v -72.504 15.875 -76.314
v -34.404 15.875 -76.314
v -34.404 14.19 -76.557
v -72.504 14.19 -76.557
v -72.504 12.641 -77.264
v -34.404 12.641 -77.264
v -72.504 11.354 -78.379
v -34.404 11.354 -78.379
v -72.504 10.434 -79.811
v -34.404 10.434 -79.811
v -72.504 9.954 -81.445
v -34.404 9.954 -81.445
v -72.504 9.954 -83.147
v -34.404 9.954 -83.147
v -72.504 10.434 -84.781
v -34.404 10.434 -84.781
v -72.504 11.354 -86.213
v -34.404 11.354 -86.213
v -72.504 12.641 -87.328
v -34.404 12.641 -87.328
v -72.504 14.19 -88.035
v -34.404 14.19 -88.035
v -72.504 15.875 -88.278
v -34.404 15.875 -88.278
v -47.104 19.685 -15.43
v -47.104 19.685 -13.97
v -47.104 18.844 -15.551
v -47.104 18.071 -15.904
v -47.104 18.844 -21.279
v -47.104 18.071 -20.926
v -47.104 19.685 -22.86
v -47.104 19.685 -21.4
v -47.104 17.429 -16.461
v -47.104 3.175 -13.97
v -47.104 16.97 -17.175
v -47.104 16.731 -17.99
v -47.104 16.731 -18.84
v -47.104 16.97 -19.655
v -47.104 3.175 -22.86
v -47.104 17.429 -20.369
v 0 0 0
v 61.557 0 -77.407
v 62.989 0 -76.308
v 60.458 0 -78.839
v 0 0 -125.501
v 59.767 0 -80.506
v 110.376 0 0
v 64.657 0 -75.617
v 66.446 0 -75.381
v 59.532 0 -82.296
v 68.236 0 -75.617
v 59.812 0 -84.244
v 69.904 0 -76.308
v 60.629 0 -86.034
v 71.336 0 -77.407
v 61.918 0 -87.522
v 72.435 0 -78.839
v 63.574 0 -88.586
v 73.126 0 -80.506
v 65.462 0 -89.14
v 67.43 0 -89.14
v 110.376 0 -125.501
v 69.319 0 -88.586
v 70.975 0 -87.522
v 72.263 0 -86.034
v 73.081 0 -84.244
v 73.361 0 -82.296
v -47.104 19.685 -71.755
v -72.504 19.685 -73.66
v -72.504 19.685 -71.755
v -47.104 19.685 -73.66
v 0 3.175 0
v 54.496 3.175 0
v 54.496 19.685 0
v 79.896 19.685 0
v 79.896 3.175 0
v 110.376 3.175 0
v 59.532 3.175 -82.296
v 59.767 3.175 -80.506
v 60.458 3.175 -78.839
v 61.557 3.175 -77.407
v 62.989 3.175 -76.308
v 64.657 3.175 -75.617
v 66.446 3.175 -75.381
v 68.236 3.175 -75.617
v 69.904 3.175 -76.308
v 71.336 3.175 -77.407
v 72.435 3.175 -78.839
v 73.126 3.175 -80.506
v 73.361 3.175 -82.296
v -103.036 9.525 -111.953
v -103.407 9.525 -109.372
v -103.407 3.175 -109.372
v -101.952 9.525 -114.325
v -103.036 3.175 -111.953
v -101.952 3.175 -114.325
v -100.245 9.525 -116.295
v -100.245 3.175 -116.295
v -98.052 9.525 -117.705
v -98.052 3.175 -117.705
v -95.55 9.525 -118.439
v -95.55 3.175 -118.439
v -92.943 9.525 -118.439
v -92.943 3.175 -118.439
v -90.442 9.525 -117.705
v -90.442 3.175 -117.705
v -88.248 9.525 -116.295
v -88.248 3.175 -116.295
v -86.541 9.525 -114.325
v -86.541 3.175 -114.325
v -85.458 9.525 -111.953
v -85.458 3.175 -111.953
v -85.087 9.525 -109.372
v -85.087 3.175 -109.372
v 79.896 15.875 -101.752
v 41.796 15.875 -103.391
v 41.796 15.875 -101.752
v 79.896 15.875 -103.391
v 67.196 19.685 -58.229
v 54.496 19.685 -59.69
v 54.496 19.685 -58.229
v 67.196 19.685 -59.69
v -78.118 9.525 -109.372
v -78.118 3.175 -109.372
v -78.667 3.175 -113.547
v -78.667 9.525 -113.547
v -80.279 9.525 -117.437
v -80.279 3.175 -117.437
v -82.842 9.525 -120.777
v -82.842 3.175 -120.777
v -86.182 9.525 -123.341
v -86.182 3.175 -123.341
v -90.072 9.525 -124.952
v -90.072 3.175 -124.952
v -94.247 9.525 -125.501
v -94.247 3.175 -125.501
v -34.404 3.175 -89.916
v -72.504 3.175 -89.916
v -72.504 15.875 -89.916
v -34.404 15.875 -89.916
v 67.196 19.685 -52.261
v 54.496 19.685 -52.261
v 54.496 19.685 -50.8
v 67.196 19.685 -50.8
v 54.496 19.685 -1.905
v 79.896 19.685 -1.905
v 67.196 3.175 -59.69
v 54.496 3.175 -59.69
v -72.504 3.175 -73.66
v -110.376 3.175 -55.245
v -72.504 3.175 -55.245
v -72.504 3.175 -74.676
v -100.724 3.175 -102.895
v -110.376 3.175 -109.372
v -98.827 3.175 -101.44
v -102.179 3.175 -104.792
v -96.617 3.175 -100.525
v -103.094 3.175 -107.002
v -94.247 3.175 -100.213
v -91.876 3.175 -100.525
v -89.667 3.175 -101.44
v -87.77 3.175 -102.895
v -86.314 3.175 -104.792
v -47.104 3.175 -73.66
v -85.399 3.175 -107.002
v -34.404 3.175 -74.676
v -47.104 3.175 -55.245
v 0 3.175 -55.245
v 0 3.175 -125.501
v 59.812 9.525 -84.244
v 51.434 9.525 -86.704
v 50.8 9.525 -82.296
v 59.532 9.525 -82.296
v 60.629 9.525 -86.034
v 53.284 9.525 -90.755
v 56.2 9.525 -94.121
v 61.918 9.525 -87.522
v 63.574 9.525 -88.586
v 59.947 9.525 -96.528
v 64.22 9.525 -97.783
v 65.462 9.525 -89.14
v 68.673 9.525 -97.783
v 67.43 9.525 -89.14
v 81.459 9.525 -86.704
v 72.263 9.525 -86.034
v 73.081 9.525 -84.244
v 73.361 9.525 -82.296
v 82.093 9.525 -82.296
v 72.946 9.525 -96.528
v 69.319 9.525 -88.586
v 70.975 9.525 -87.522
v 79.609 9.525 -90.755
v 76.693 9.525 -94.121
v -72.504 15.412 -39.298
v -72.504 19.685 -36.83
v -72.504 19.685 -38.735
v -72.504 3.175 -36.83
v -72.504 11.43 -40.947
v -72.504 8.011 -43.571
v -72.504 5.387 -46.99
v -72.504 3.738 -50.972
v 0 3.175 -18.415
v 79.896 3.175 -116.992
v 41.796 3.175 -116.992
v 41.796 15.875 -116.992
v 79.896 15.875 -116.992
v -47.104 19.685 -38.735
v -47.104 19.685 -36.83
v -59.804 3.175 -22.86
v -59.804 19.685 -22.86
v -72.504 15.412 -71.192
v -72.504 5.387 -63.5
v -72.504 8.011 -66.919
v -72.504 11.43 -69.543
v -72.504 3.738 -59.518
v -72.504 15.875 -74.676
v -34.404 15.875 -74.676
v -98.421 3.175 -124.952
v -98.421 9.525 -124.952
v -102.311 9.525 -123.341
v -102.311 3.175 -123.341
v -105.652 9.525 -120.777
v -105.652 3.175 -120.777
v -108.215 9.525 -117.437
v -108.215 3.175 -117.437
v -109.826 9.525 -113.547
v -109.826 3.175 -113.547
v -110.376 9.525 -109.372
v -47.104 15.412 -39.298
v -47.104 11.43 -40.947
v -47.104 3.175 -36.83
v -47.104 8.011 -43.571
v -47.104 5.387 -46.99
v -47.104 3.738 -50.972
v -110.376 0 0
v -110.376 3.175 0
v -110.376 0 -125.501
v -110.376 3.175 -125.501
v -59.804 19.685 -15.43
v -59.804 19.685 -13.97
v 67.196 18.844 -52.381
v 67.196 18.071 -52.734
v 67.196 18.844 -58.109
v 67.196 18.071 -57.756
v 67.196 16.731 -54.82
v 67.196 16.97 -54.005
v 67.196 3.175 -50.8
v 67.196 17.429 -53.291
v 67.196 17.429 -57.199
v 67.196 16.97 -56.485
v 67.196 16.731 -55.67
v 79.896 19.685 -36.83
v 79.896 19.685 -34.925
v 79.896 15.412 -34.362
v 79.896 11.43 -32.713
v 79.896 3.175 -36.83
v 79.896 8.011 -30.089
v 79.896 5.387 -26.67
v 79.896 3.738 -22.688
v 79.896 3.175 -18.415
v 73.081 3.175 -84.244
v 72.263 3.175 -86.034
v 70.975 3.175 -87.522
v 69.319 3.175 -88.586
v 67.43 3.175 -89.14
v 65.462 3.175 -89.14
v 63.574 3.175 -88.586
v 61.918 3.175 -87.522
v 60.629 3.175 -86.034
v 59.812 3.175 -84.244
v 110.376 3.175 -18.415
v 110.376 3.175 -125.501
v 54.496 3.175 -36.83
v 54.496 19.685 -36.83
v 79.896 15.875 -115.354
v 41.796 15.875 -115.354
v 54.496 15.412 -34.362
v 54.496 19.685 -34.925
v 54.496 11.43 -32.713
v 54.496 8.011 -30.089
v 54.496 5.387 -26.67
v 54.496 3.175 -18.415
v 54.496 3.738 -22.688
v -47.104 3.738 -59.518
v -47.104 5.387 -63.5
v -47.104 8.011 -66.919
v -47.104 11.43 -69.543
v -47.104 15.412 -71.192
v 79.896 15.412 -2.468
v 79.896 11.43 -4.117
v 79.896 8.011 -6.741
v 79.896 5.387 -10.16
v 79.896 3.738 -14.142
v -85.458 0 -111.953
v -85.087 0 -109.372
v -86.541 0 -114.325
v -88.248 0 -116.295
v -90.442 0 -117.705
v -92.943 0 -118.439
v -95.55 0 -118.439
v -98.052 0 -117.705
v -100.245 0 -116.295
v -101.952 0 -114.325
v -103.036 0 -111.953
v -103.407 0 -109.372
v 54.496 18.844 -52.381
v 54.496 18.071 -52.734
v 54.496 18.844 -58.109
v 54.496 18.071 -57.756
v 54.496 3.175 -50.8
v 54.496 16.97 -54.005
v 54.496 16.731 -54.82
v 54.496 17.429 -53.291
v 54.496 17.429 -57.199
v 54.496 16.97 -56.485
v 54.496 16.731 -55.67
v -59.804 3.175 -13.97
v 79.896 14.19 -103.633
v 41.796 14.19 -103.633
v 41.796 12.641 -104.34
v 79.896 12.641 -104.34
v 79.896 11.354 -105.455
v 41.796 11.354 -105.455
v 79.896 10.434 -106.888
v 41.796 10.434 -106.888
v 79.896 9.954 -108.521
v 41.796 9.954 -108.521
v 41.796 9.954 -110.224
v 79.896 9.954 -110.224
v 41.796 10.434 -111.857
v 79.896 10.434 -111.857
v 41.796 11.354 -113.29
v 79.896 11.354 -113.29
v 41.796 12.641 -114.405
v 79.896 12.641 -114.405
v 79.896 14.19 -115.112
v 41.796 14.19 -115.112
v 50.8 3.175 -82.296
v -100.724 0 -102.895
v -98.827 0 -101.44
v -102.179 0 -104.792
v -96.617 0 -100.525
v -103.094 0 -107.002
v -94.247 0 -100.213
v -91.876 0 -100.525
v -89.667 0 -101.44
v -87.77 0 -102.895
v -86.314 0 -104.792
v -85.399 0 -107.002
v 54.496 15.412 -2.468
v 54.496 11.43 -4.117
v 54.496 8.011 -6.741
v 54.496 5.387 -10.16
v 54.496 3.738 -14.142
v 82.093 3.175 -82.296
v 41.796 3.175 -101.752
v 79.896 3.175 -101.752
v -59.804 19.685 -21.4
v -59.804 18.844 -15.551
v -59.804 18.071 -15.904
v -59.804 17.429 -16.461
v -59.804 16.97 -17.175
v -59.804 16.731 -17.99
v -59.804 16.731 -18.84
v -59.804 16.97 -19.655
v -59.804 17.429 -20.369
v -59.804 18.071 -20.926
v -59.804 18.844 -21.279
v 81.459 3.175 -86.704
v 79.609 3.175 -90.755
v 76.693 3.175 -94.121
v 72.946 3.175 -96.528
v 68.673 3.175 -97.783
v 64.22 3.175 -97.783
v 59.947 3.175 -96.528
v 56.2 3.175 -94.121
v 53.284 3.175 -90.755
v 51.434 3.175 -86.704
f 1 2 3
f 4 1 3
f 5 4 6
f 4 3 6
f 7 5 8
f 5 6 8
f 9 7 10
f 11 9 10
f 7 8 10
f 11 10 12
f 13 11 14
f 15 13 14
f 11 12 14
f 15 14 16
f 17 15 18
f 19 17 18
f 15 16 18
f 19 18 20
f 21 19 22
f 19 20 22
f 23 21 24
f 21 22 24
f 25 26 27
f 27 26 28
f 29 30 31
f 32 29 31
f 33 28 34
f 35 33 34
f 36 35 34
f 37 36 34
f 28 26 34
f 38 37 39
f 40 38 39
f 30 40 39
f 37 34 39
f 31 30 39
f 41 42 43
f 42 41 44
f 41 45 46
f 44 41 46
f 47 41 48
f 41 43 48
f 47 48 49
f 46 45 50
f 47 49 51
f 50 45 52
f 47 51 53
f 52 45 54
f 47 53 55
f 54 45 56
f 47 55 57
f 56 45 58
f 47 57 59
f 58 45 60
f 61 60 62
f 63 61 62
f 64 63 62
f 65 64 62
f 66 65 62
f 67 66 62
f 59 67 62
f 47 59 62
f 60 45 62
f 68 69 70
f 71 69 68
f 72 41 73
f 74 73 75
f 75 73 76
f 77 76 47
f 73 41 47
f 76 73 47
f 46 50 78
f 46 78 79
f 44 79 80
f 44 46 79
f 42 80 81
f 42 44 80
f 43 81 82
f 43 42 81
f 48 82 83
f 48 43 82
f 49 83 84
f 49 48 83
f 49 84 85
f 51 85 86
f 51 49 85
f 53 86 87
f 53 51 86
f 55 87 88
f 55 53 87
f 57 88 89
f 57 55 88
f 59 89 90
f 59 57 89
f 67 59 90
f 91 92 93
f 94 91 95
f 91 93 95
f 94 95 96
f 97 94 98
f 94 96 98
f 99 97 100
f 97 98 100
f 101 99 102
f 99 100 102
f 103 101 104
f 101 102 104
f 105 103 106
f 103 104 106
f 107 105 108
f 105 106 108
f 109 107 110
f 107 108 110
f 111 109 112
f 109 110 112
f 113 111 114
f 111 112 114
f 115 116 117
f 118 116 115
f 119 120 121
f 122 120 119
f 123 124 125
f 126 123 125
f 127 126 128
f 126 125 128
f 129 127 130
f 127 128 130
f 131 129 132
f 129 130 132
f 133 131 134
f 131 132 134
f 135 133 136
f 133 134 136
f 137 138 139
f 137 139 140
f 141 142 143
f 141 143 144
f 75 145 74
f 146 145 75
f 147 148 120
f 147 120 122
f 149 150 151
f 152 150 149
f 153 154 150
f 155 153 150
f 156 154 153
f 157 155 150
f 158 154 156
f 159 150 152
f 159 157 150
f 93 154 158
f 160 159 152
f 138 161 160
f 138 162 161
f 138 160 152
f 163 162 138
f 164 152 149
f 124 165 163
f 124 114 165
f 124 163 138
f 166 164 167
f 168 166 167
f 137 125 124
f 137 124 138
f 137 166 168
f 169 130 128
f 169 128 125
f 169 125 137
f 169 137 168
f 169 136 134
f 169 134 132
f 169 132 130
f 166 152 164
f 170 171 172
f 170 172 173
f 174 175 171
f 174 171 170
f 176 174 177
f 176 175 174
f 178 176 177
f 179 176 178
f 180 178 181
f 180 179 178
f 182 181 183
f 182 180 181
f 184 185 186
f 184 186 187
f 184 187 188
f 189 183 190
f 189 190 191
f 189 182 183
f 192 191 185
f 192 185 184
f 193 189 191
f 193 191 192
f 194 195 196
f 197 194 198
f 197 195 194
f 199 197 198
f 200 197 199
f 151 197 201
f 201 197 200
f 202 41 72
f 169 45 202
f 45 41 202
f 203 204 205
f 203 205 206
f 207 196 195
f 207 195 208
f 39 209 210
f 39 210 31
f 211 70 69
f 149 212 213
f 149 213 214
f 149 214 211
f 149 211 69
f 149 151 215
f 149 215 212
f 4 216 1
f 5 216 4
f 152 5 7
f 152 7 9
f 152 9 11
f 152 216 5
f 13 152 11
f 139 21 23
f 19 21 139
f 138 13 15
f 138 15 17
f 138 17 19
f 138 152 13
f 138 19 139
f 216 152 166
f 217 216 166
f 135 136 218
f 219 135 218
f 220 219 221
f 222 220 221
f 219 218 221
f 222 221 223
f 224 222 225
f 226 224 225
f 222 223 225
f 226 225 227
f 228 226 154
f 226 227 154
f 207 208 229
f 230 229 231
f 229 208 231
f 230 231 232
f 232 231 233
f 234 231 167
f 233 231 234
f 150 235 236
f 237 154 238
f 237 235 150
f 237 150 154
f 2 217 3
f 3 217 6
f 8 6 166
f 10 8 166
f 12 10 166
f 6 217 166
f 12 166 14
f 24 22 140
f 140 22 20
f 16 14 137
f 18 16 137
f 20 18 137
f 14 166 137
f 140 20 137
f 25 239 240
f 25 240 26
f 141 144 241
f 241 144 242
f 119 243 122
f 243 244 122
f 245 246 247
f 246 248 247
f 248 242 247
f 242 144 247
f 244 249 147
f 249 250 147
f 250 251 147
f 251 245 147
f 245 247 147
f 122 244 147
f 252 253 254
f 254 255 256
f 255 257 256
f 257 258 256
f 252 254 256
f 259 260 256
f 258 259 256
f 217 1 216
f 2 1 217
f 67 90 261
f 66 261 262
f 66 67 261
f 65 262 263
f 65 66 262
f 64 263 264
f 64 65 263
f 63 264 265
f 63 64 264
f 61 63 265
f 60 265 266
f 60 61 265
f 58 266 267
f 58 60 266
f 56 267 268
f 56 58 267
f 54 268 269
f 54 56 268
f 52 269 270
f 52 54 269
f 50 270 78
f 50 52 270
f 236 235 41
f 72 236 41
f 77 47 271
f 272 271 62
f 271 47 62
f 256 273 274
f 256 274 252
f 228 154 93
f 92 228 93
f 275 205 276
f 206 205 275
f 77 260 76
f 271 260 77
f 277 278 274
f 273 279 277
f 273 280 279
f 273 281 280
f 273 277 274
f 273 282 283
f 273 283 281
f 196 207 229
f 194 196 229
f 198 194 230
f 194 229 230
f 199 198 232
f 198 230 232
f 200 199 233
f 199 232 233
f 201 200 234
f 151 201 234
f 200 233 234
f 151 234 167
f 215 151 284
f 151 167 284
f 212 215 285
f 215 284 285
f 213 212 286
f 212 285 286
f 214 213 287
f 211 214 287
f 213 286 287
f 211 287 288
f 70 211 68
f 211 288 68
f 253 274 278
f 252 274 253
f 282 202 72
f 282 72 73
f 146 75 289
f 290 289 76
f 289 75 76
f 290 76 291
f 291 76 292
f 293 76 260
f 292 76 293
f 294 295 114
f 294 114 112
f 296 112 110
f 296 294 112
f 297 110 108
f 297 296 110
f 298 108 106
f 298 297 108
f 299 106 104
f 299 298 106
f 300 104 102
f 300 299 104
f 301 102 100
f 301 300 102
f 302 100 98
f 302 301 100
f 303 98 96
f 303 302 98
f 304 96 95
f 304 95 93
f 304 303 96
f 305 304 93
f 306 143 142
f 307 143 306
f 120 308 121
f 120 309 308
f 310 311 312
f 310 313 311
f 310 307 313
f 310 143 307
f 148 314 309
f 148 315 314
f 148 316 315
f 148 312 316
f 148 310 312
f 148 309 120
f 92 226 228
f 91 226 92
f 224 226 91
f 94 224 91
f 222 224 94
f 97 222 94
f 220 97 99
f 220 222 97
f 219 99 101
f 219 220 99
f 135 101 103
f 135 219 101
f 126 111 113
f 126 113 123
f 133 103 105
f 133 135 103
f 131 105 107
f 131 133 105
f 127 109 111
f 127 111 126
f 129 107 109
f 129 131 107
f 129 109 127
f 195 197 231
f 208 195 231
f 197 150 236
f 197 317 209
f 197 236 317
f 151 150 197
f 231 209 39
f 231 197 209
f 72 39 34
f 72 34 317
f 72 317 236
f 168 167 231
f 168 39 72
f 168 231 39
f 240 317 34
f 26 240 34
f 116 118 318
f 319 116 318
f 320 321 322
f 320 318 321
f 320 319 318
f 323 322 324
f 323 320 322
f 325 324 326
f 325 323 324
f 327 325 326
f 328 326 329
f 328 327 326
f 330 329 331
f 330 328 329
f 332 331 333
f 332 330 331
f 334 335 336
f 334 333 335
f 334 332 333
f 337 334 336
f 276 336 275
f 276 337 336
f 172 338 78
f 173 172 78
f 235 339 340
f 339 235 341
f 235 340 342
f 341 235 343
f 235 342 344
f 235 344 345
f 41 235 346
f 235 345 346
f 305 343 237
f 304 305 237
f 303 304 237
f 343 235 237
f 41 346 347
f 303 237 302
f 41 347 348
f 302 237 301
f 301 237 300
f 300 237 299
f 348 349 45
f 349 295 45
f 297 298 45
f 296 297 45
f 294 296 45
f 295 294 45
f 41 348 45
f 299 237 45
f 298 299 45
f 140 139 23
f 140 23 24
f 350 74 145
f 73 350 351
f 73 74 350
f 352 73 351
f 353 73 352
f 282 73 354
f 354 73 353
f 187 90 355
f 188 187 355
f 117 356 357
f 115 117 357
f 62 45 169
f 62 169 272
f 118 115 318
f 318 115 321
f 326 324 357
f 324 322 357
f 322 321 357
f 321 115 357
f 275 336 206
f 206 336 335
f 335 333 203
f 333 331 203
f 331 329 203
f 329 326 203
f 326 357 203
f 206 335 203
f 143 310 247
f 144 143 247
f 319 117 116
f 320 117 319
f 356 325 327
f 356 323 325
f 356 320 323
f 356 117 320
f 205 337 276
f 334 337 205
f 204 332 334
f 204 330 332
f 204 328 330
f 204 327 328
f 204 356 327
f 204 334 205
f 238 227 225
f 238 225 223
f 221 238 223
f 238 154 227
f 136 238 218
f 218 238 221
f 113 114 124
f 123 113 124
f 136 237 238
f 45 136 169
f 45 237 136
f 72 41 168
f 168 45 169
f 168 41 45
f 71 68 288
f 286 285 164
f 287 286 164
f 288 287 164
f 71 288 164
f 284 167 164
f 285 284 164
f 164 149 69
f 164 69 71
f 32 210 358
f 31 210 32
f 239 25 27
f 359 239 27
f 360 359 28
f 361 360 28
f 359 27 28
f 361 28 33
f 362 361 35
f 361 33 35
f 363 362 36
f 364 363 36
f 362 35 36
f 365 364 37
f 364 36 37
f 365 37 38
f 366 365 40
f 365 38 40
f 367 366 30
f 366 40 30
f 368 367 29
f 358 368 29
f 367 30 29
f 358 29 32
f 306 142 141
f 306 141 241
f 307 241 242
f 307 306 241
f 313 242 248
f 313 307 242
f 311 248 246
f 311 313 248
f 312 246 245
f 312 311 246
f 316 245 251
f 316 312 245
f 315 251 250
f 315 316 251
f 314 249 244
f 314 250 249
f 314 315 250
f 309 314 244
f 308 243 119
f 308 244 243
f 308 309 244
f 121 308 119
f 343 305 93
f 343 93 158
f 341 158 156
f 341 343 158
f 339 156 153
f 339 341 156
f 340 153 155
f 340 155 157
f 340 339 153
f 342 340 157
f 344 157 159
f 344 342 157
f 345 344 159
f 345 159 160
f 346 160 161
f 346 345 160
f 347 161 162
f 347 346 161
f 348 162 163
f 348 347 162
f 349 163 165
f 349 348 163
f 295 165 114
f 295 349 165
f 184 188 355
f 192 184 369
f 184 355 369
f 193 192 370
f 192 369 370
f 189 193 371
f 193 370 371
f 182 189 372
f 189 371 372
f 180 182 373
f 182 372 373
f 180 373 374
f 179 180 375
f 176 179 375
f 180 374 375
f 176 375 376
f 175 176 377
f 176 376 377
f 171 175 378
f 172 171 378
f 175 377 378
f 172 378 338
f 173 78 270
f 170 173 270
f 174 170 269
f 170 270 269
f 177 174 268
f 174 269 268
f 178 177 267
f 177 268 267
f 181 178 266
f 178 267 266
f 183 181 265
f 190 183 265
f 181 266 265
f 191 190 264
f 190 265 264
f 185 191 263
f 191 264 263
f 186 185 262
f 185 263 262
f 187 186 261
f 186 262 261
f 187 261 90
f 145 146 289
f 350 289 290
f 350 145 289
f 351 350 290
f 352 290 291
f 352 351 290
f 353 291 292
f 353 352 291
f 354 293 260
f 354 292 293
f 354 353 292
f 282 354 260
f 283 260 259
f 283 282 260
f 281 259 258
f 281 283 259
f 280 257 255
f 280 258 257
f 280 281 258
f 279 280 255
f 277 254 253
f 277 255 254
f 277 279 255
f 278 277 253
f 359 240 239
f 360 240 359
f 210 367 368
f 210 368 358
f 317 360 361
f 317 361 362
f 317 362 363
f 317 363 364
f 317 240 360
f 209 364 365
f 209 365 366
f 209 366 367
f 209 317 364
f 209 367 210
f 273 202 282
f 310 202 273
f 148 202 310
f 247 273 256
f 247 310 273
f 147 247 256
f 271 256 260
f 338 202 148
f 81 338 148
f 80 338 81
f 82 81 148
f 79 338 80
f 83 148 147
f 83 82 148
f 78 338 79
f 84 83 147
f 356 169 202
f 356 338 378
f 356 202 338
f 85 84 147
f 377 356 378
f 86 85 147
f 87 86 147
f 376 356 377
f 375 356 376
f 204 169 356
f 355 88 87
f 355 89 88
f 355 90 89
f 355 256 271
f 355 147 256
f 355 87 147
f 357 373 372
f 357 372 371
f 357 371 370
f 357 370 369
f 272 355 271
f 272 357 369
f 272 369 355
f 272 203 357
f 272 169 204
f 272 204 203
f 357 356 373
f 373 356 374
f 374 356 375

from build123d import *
from build123d.topology import SkipClean

# Parameters (mm, degrees)
SKETCH1_W                   = 220.7514
SKETCH1_H                   = 125.5014
SKETCH1_R                   = 9.159861243
SKETCH1_R_2                 = 6.914797213
BASE_DEPTH                  = 3.175
SKETCH1_3_W                 = 38.1
SKETCH1_3_H                 = 15.24
RATCHET_HANDLE_DEPTH        = 15.875
RATCHET_HEAD_DEPTH          = 9.525
SKETCH1_5_W                 = 25.4
SKETCH1_5_H                 = 36.83
SKETCH1_5_W_2               = 12.7
SKETCH1_5_H_2               = 8.89
SCREWDRIVER_DEPTH           = 19.685
SKETCH2_R                   = 2.9845
SKETCH2_R_2                 = 16.51
SCREWDRIVER_LEFT_CUT_DEPTH  = 169.288133204
SKETCH2_3_R                 = 16.51
SKETCH2_3_R_2               = 2.9845
SCREWDRIVER_RIGHT_CUT_DEPTH = 169.288133204
SKETCH2_4_R                 = 5.9817
FRONT_RATCHET_CUT_DEPTH     = 169.288133204
SKETCH2_5_R                 = 5.9817
BACK_RATCHET_CUT_DEPTH      = 169.288133204
SPLIT2_SURFACE_1_BACK       = 255.694
SPLIT2_SURFACE_1_DEPTH      = 511.388
SPLIT2_SURFACE_2_BACK       = 255.694
SPLIT2_SURFACE_2_DEPTH      = 511.388


with BuildPart() as part:
    # Sketch1 → Base (new body)
    with BuildSketch(Plane(origin=(0, 0, 0), x_dir=(1, 0, 0), z_dir=(0, 1, 0))):
        with Locations((0, 62.7507)):
            Rectangle(SKETCH1_W, SKETCH1_H)
        with Locations((-94.2467, 109.3724)):
            Circle(SKETCH1_R, mode=Mode.SUBTRACT)
        with Locations((66.4464, 82.296)):
            Circle(SKETCH1_R_2, mode=Mode.SUBTRACT)
    extrude(amount=BASE_DEPTH)

    # Sketch1<3> → Ratchet Handle (add)
    with BuildSketch(Plane(origin=(0, 0, 0), x_dir=(1, 0, 0), z_dir=(0, 1, 0))):
        with Locations((-53.4543, 82.296)):
            Rectangle(SKETCH1_3_W, SKETCH1_3_H)
        with Locations((60.8457, 109.3724)):
            Rectangle(SKETCH1_3_W, SKETCH1_3_H)
    extrude(amount=RATCHET_HANDLE_DEPTH)

    # Sketch1<4> → Ratchet Head (add)
    with SkipClean():  # the faces are left unmerged after this step: merging them gives an invalid solid
        with BuildSketch(Plane(origin=(0, 0, 0), x_dir=(1, 0, 0), z_dir=(0, 1, 0))):
            with BuildLine():
                ThreePointArc((-78.1177, 109.3724), (-94.2467, 125.5014), (-110.3757, 109.3724))
                Line((-110.3757, 109.3724), (-103.406561243, 109.3724))
                ThreePointArc((-103.406561243, 109.3724), (-94.2467, 118.532261243), (-85.086838757, 109.3724))
                Line((-85.086838757, 109.3724), (-78.1177, 109.3724))
            make_face()
            with BuildLine():
                ThreePointArc((59.531602787, 82.296), (66.4464, 89.210797213), (73.361197213, 82.296))
                Line((73.361197213, 82.296), (82.0928, 82.296))
                ThreePointArc((82.0928, 82.296), (66.4464, 97.9424), (50.8, 82.296))
                Line((50.8, 82.296), (59.531602787, 82.296))
            make_face()
        extrude(amount=RATCHET_HEAD_DEPTH)

    # Sketch1<5> → Screwdriver (add)
    with SkipClean():  # the faces are left unmerged after this step: merging them gives an invalid solid
        with BuildSketch(Plane(origin=(0, 0, 0), x_dir=(1, 0, 0), z_dir=(0, 1, 0))):
            with Locations((67.1957, 18.415)):
                Rectangle(SKETCH1_5_W, SKETCH1_5_H)
            with Locations((-53.4543, 18.415)):
                Rectangle(SKETCH1_5_W_2, SKETCH1_5_H_2)
            with Locations((60.8457, 55.245)):
                Rectangle(SKETCH1_5_W_2, SKETCH1_5_H_2)
            with Locations((-59.8043, 55.245)):
                Rectangle(SKETCH1_5_W, SKETCH1_5_H)
        extrude(amount=SCREWDRIVER_DEPTH)
    add(part.part.scale(1), mode=Mode.REPLACE)  # the faces are merged on a copy

    # Sketch2 → Screwdriver Left Cut (cut, through all)
    with BuildSketch(Plane(origin=(0, 0, 0), x_dir=(0, 0, -1), z_dir=(1, 0, 0))):
        with Locations((18.415, 19.685)):
            Circle(SKETCH2_R)
        with Locations((55.245, 19.685)):
            Circle(SKETCH2_R_2)
    extrude(amount=-SCREWDRIVER_LEFT_CUT_DEPTH, mode=Mode.SUBTRACT)

    # Sketch2<3> → Screwdriver Right Cut (cut, through all)
    with BuildSketch(Plane(origin=(0, 0, 0), x_dir=(0, 0, -1), z_dir=(1, 0, 0))):
        with Locations((18.415, 19.685)):
            Circle(SKETCH2_3_R)
        with Locations((55.245, 19.685)):
            Circle(SKETCH2_3_R_2)
    extrude(amount=SCREWDRIVER_RIGHT_CUT_DEPTH, mode=Mode.SUBTRACT)

    # Sketch2<4> → Front Ratchet Cut (cut, through all)
    with BuildSketch(Plane(origin=(0, 0, 0), x_dir=(0, 0, -1), z_dir=(1, 0, 0))):
        with Locations((82.296, 15.875)):
            Circle(SKETCH2_4_R)
    extrude(amount=-FRONT_RATCHET_CUT_DEPTH, mode=Mode.SUBTRACT)

    # Sketch2<5> → Back Ratchet Cut (cut, through all)
    with BuildSketch(Plane(origin=(0, 0, 0), x_dir=(0, 0, -1), z_dir=(1, 0, 0))):
        with Locations((109.3724, 15.875)):
            Circle(SKETCH2_5_R)
    extrude(amount=BACK_RATCHET_CUT_DEPTH, mode=Mode.SUBTRACT)


with BuildPart() as body_2:
    # Split2: the piece behind the surface
    add(part.part)
    # Split2 surface: a surface, the sketch's curves swept straight by 511.388 mm
    with BuildLine(Plane.XY.offset(-SPLIT2_SURFACE_1_BACK), mode=Mode.PRIVATE) as split2_surface_1_path:
        Line((0, 0), (0, 3.175))
    split2_surface_1 = Shell.extrude(split2_surface_1_path.wire(), (0 * SPLIT2_SURFACE_1_DEPTH, 0 * SPLIT2_SURFACE_1_DEPTH, 1 * SPLIT2_SURFACE_1_DEPTH))
    split(bisect_by=split2_surface_1, keep=Keep.BOTTOM)


with BuildPart() as part_1:
    add(part.part)

    # Split2: split by a surface, the side it looks to stays
    # Split2 surface: a surface, the sketch's curves swept straight by 511.388 mm
    with BuildLine(Plane.XY.offset(-SPLIT2_SURFACE_2_BACK), mode=Mode.PRIVATE) as split2_surface_2_path:
        Line((0, 0), (0, 3.175))
    split2_surface_2 = Shell.extrude(split2_surface_2_path.wire(), (0 * SPLIT2_SURFACE_2_DEPTH, 0 * SPLIT2_SURFACE_2_DEPTH, 1 * SPLIT2_SURFACE_2_DEPTH))
    split(bisect_by=split2_surface_2, keep=Keep.TOP)


solid = Compound([body_2.part, part_1.part])
